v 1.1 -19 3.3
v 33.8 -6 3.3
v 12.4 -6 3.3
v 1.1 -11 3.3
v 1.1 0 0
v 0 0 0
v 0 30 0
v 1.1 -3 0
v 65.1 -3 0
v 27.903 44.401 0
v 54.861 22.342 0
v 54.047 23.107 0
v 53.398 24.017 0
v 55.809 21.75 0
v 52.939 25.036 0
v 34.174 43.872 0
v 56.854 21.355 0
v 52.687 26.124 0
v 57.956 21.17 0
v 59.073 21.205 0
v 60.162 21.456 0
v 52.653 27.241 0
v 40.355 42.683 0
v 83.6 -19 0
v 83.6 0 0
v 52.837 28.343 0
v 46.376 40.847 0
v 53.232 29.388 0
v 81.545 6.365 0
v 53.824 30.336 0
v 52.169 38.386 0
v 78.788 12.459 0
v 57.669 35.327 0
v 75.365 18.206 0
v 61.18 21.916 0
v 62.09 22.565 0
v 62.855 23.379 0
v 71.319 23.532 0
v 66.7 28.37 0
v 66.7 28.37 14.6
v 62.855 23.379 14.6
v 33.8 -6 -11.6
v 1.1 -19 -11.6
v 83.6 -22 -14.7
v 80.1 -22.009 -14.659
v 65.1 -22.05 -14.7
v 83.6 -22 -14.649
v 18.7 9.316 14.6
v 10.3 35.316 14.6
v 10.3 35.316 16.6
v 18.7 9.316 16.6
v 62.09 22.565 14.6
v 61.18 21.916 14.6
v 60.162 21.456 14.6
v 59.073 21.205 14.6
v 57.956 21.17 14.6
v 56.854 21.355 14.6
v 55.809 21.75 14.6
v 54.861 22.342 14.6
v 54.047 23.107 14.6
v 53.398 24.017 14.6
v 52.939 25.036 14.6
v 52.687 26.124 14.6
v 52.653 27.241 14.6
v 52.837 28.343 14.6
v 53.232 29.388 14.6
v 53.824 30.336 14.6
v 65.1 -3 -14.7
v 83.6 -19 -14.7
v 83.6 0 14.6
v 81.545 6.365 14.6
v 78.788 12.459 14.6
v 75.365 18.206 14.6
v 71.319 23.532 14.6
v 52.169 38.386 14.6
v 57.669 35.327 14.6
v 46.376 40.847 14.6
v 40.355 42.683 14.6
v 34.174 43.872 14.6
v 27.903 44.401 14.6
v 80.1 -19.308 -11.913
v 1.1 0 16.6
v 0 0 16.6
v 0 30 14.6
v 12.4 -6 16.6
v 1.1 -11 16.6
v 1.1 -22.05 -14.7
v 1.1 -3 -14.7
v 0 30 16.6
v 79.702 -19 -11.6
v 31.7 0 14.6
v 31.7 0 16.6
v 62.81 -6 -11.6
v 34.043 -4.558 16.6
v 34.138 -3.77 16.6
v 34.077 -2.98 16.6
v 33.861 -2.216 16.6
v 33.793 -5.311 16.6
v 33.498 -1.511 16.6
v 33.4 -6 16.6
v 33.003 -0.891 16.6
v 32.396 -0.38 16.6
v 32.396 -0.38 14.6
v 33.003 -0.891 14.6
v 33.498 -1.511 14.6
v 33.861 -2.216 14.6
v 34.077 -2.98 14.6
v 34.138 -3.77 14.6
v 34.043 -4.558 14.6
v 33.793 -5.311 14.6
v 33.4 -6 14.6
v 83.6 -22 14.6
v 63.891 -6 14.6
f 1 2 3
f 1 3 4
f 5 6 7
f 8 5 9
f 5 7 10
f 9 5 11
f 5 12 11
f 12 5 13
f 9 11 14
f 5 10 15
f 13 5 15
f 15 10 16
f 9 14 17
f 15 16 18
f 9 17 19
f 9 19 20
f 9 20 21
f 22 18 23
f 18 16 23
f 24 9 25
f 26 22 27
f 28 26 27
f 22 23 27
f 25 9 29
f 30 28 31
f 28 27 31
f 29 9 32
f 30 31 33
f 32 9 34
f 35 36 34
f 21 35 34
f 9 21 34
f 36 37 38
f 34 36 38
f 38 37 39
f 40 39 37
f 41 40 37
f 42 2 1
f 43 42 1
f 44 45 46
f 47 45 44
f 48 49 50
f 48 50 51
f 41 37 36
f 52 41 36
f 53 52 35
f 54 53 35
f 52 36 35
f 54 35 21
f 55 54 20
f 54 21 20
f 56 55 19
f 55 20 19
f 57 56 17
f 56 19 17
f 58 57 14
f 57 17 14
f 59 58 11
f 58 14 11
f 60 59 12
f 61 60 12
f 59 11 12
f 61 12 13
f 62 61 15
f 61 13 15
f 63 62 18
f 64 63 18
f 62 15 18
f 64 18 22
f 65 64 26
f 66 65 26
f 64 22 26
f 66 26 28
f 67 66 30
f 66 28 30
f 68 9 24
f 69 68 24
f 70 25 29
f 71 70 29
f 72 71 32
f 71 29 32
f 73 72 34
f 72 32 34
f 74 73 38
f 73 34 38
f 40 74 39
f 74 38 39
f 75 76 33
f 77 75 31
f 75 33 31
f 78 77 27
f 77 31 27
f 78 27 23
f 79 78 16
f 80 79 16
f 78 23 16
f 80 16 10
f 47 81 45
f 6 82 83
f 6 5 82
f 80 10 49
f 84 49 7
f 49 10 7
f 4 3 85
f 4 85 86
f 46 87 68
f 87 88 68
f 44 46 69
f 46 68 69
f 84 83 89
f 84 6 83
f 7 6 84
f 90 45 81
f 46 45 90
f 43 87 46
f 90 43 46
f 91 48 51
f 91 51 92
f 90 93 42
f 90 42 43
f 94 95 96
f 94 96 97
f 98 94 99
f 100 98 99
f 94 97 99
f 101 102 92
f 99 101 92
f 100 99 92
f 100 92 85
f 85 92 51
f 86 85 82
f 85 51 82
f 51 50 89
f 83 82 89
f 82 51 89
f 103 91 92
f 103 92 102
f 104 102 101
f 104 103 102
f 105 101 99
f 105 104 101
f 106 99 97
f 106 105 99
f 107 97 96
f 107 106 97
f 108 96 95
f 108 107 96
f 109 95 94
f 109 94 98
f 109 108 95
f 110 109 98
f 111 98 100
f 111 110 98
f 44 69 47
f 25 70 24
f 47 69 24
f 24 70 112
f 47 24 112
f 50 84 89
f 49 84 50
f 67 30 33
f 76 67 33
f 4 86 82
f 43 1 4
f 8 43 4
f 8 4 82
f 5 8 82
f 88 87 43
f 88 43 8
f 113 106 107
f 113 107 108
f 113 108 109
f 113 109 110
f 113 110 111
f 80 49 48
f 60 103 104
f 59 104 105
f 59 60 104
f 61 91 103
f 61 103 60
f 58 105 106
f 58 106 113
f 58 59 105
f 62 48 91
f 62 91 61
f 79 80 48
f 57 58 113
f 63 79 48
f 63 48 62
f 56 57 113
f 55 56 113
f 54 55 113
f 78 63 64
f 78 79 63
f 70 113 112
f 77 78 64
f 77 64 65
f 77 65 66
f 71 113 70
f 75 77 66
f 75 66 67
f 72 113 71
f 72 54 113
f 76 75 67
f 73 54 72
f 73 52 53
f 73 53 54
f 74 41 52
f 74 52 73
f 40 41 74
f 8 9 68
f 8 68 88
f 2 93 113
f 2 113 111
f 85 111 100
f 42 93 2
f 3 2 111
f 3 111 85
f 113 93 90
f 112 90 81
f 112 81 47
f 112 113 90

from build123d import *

# Parameters (mm, degrees)
ESTRUSIONE_ESTRUSIONE1_DEPTH  = 14.6
SCHIZZO2_W                    = 64
SCHIZZO2_H                    = 3
ESTRUSIONE_ESTRUSIONE2_DEPTH  = 14.7
ESTRUSIONE_ESTRUSIONE3_DEPTH  = 11.3
ESTRUSIONE_ESTRUSIONE4_DEPTH  = 14.9
SCHIZZO6_W                    = 64
SCHIZZO6_H                    = 3.1
ESTRUSIONE_ESTRUSIONE5_DEPTH  = 13
ESTRUSIONE_ESTRUSIONE8_START  = -64
ESTRUSIONE_ESTRUSIONE8_DEPTH  = 64
ESTRUSIONE_ESTRUSIONE9_DEPTH  = 14.6
ESTRUSIONE_ESTRUSIONE13_DEPTH = 14.7
ESTRUSIONE_ESTRUSIONE14_START = -3.1
ESTRUSIONE_ESTRUSIONE14_DEPTH = 3.1
TAGLIO_ESTRUSIONE3_DEPTH      = 15
TAGLIO_ESTRUSIONE4_REACH      = 94.756
ESTRUSIONE_ESTRUSIONE15_DEPTH = 2


with BuildPart() as part:
    # Schizzo1 → Estrusione-Estrusione1 (new body)
    with BuildSketch(Plane.XY):
        with BuildLine():
            Line((0, 30), (0, 0))
            Line((0, 0), (1.1, 0))
            Line((1.1, 0), (1.1, -6))
            Line((1.1, -6), (83.6, -6))
            Line((83.6, -6), (83.6, 0))
            ThreePointArc((83.6, 0), (77.157447993, 15.380640119), (66.7, 28.36957188))
            Line((66.7, 28.36957188), (62.855201518, 23.378827984))
            ThreePointArc((62.855201518, 23.378827984), (54.861139367, 22.342020228), (53.824331611, 30.336082379))
            Line((53.824331611, 30.336082379), (57.669130093, 35.326826275))
            ThreePointArc((57.669130093, 35.326826275), (43.389650216, 41.844502061), (27.902688632, 44.401387681))
            Line((27.902688632, 44.401387681), (0, 30))
        make_face()
    extrude(amount=ESTRUSIONE_ESTRUSIONE1_DEPTH)

    # Schizzo2 → Estrusione-Estrusione2 (add)
    with BuildSketch(Plane(origin=(0, 0, 0), x_dir=(-1, 0, 0), z_dir=(0, 0, -1))):
        with Locations((-33.1, -4.5)):
            Rectangle(SCHIZZO2_W, SCHIZZO2_H)
    extrude(amount=ESTRUSIONE_ESTRUSIONE2_DEPTH)

    # Schizzo4 → Estrusione-Estrusione3 (add)
    with BuildSketch(Plane.XY.offset(14.6)):
        Polygon((1.1, -6), (12.4, -6), (1.1, -11), align=None)
    extrude(amount=-ESTRUSIONE_ESTRUSIONE3_DEPTH)

    # Schizzo5 → Estrusione-Estrusione4 (add)
    with BuildSketch(Plane(origin=(0, 0, 3.3), x_dir=(-1, 0, 0), z_dir=(0, 0, -1))):
        Polygon((-1.1, -6), (-33.8, -6), (-1.1, -19), align=None)
    extrude(amount=ESTRUSIONE_ESTRUSIONE4_DEPTH)

    # Schizzo6 → Estrusione-Estrusione5 (add)
    with BuildSketch(Plane.XZ.offset(6)):
        with Locations((33.1, -13.15)):
            Rectangle(SCHIZZO6_W, SCHIZZO6_H)
    extrude(amount=ESTRUSIONE_ESTRUSIONE5_DEPTH)

    # Schizzo7 → Estrusione-Estrusione8 (add)
    with BuildSketch(Plane(origin=(65.1, 0, 0), x_dir=(0, 0, -1), z_dir=(1, 0, 0)).offset(ESTRUSIONE_ESTRUSIONE8_START)):
        Polygon((14.7, -19), (14.7, -22.05), (11.6, -19), align=None)
    extrude(amount=ESTRUSIONE_ESTRUSIONE8_DEPTH)

    # Schizzo9 → Estrusione-Estrusione9 (add)
    with BuildSketch(Plane.XY):
        Polygon((83.6, -6), (65.1, -6), (83.6, -22), align=None)
    extrude(amount=ESTRUSIONE_ESTRUSIONE9_DEPTH)

    # Schizzo16 → Estrusione-Estrusione13 (add)
    with BuildSketch(Plane(origin=(0, 0, 0), x_dir=(-1, 0, 0), z_dir=(0, 0, -1))):
        Polygon((-65.1, -3), (-83.6, -19), (-83.6, -22), (-65.1, -6), align=None)
    extrude(amount=ESTRUSIONE_ESTRUSIONE13_DEPTH)

    # Schizzo17 → Estrusione-Estrusione14 (add)
    with BuildSketch(Plane(origin=(0, 0, -14.7), x_dir=(-1, 0, 0), z_dir=(0, 0, -1)).offset(ESTRUSIONE_ESTRUSIONE14_START)):
        Polygon((-65.1, -6), (-65.1, -22.05), (-83.6, -22), align=None)
    extrude(amount=ESTRUSIONE_ESTRUSIONE14_DEPTH)

    # Schizzo18 → Taglio-Estrusione3 (cut)
    with BuildSketch(Plane.ZY.offset(-65.1)):
        Polygon((-11.6, -22.05), (-11.6, -19), (-14.7, -22.05), align=None)
    extrude(amount=-TAGLIO_ESTRUSIONE3_DEPTH, mode=Mode.SUBTRACT)

    # Taglio-Estrusione4: up to this face of the body (flat: up to its plane)
    taglio_estrusione4_end = Plane(part.part.faces().sort_by_distance((74.35, -14, 1.5))[0])
    # Schizzo20 → Taglio-Estrusione4 (cut, up to the picked face)
    with BuildSketch(Plane.ZY.offset(-80.1), mode=Mode.PRIVATE) as taglio_estrusione4_sk1:
        Polygon((-11.6, -22.009459459), (-11.6, -19), (-14.65879486, -22.009459459), align=None)
    taglio_estrusione4_tool1 = split(extrude(taglio_estrusione4_sk1.sketch, amount=-TAGLIO_ESTRUSIONE4_REACH, mode=Mode.PRIVATE), bisect_by=taglio_estrusione4_end, keep=Keep.BOTH, mode=Mode.PRIVATE)
    add(taglio_estrusione4_tool1.solids().sort_by(Axis((80.1, -21.006306, -12.619598), (1, 0, 0)))[0], mode=Mode.SUBTRACT)

    # Schizzo22 → Loft3 section 0
    with BuildSketch(Plane(origin=(0, 0, -14.7), x_dir=(-1, 0, 0), z_dir=(0, 0, -1))):
        with BuildLine():
            Line((-65.1, -6), (-62.68232007, -6))
            Line((-62.68232007, -6), (-83.6, -22))
            Line((-83.6, -22), (-65.1, -6))
        make_face()
    # Schizzo23 → Loft3 section 1
    with BuildSketch(Plane.XY.offset(14.6)):
        with BuildLine():
            Line((65.1, -6), (83.6, -22))
            Line((83.6, -22), (63.891160035, -6))
            Line((63.891160035, -6), (65.1, -6))
        make_face()
    loft()

    # Schizzo19 → Estrusione-Estrusione15 (add)
    with BuildSketch(Plane.XY.offset(14.6)):
        with BuildLine():
            Line((0, 30), (10.3, 35.316129032))
            Line((10.3, 35.316129032), (18.7, 9.316129032))
            Line((18.7, 9.316129032), (31.7, 0))
            ThreePointArc((31.7, 0), (33.987904201, -2.59259381), (33.4, -6))
            Line((33.4, -6), (12.4, -6))
            Line((12.4, -6), (1.1, -11))
            Line((1.1, -11), (1.1, 0))
            Line((1.1, 0), (0, 0))
            Line((0, 0), (0, 30))
        make_face()
    extrude(amount=ESTRUSIONE_ESTRUSIONE15_DEPTH)


solid = part.part
